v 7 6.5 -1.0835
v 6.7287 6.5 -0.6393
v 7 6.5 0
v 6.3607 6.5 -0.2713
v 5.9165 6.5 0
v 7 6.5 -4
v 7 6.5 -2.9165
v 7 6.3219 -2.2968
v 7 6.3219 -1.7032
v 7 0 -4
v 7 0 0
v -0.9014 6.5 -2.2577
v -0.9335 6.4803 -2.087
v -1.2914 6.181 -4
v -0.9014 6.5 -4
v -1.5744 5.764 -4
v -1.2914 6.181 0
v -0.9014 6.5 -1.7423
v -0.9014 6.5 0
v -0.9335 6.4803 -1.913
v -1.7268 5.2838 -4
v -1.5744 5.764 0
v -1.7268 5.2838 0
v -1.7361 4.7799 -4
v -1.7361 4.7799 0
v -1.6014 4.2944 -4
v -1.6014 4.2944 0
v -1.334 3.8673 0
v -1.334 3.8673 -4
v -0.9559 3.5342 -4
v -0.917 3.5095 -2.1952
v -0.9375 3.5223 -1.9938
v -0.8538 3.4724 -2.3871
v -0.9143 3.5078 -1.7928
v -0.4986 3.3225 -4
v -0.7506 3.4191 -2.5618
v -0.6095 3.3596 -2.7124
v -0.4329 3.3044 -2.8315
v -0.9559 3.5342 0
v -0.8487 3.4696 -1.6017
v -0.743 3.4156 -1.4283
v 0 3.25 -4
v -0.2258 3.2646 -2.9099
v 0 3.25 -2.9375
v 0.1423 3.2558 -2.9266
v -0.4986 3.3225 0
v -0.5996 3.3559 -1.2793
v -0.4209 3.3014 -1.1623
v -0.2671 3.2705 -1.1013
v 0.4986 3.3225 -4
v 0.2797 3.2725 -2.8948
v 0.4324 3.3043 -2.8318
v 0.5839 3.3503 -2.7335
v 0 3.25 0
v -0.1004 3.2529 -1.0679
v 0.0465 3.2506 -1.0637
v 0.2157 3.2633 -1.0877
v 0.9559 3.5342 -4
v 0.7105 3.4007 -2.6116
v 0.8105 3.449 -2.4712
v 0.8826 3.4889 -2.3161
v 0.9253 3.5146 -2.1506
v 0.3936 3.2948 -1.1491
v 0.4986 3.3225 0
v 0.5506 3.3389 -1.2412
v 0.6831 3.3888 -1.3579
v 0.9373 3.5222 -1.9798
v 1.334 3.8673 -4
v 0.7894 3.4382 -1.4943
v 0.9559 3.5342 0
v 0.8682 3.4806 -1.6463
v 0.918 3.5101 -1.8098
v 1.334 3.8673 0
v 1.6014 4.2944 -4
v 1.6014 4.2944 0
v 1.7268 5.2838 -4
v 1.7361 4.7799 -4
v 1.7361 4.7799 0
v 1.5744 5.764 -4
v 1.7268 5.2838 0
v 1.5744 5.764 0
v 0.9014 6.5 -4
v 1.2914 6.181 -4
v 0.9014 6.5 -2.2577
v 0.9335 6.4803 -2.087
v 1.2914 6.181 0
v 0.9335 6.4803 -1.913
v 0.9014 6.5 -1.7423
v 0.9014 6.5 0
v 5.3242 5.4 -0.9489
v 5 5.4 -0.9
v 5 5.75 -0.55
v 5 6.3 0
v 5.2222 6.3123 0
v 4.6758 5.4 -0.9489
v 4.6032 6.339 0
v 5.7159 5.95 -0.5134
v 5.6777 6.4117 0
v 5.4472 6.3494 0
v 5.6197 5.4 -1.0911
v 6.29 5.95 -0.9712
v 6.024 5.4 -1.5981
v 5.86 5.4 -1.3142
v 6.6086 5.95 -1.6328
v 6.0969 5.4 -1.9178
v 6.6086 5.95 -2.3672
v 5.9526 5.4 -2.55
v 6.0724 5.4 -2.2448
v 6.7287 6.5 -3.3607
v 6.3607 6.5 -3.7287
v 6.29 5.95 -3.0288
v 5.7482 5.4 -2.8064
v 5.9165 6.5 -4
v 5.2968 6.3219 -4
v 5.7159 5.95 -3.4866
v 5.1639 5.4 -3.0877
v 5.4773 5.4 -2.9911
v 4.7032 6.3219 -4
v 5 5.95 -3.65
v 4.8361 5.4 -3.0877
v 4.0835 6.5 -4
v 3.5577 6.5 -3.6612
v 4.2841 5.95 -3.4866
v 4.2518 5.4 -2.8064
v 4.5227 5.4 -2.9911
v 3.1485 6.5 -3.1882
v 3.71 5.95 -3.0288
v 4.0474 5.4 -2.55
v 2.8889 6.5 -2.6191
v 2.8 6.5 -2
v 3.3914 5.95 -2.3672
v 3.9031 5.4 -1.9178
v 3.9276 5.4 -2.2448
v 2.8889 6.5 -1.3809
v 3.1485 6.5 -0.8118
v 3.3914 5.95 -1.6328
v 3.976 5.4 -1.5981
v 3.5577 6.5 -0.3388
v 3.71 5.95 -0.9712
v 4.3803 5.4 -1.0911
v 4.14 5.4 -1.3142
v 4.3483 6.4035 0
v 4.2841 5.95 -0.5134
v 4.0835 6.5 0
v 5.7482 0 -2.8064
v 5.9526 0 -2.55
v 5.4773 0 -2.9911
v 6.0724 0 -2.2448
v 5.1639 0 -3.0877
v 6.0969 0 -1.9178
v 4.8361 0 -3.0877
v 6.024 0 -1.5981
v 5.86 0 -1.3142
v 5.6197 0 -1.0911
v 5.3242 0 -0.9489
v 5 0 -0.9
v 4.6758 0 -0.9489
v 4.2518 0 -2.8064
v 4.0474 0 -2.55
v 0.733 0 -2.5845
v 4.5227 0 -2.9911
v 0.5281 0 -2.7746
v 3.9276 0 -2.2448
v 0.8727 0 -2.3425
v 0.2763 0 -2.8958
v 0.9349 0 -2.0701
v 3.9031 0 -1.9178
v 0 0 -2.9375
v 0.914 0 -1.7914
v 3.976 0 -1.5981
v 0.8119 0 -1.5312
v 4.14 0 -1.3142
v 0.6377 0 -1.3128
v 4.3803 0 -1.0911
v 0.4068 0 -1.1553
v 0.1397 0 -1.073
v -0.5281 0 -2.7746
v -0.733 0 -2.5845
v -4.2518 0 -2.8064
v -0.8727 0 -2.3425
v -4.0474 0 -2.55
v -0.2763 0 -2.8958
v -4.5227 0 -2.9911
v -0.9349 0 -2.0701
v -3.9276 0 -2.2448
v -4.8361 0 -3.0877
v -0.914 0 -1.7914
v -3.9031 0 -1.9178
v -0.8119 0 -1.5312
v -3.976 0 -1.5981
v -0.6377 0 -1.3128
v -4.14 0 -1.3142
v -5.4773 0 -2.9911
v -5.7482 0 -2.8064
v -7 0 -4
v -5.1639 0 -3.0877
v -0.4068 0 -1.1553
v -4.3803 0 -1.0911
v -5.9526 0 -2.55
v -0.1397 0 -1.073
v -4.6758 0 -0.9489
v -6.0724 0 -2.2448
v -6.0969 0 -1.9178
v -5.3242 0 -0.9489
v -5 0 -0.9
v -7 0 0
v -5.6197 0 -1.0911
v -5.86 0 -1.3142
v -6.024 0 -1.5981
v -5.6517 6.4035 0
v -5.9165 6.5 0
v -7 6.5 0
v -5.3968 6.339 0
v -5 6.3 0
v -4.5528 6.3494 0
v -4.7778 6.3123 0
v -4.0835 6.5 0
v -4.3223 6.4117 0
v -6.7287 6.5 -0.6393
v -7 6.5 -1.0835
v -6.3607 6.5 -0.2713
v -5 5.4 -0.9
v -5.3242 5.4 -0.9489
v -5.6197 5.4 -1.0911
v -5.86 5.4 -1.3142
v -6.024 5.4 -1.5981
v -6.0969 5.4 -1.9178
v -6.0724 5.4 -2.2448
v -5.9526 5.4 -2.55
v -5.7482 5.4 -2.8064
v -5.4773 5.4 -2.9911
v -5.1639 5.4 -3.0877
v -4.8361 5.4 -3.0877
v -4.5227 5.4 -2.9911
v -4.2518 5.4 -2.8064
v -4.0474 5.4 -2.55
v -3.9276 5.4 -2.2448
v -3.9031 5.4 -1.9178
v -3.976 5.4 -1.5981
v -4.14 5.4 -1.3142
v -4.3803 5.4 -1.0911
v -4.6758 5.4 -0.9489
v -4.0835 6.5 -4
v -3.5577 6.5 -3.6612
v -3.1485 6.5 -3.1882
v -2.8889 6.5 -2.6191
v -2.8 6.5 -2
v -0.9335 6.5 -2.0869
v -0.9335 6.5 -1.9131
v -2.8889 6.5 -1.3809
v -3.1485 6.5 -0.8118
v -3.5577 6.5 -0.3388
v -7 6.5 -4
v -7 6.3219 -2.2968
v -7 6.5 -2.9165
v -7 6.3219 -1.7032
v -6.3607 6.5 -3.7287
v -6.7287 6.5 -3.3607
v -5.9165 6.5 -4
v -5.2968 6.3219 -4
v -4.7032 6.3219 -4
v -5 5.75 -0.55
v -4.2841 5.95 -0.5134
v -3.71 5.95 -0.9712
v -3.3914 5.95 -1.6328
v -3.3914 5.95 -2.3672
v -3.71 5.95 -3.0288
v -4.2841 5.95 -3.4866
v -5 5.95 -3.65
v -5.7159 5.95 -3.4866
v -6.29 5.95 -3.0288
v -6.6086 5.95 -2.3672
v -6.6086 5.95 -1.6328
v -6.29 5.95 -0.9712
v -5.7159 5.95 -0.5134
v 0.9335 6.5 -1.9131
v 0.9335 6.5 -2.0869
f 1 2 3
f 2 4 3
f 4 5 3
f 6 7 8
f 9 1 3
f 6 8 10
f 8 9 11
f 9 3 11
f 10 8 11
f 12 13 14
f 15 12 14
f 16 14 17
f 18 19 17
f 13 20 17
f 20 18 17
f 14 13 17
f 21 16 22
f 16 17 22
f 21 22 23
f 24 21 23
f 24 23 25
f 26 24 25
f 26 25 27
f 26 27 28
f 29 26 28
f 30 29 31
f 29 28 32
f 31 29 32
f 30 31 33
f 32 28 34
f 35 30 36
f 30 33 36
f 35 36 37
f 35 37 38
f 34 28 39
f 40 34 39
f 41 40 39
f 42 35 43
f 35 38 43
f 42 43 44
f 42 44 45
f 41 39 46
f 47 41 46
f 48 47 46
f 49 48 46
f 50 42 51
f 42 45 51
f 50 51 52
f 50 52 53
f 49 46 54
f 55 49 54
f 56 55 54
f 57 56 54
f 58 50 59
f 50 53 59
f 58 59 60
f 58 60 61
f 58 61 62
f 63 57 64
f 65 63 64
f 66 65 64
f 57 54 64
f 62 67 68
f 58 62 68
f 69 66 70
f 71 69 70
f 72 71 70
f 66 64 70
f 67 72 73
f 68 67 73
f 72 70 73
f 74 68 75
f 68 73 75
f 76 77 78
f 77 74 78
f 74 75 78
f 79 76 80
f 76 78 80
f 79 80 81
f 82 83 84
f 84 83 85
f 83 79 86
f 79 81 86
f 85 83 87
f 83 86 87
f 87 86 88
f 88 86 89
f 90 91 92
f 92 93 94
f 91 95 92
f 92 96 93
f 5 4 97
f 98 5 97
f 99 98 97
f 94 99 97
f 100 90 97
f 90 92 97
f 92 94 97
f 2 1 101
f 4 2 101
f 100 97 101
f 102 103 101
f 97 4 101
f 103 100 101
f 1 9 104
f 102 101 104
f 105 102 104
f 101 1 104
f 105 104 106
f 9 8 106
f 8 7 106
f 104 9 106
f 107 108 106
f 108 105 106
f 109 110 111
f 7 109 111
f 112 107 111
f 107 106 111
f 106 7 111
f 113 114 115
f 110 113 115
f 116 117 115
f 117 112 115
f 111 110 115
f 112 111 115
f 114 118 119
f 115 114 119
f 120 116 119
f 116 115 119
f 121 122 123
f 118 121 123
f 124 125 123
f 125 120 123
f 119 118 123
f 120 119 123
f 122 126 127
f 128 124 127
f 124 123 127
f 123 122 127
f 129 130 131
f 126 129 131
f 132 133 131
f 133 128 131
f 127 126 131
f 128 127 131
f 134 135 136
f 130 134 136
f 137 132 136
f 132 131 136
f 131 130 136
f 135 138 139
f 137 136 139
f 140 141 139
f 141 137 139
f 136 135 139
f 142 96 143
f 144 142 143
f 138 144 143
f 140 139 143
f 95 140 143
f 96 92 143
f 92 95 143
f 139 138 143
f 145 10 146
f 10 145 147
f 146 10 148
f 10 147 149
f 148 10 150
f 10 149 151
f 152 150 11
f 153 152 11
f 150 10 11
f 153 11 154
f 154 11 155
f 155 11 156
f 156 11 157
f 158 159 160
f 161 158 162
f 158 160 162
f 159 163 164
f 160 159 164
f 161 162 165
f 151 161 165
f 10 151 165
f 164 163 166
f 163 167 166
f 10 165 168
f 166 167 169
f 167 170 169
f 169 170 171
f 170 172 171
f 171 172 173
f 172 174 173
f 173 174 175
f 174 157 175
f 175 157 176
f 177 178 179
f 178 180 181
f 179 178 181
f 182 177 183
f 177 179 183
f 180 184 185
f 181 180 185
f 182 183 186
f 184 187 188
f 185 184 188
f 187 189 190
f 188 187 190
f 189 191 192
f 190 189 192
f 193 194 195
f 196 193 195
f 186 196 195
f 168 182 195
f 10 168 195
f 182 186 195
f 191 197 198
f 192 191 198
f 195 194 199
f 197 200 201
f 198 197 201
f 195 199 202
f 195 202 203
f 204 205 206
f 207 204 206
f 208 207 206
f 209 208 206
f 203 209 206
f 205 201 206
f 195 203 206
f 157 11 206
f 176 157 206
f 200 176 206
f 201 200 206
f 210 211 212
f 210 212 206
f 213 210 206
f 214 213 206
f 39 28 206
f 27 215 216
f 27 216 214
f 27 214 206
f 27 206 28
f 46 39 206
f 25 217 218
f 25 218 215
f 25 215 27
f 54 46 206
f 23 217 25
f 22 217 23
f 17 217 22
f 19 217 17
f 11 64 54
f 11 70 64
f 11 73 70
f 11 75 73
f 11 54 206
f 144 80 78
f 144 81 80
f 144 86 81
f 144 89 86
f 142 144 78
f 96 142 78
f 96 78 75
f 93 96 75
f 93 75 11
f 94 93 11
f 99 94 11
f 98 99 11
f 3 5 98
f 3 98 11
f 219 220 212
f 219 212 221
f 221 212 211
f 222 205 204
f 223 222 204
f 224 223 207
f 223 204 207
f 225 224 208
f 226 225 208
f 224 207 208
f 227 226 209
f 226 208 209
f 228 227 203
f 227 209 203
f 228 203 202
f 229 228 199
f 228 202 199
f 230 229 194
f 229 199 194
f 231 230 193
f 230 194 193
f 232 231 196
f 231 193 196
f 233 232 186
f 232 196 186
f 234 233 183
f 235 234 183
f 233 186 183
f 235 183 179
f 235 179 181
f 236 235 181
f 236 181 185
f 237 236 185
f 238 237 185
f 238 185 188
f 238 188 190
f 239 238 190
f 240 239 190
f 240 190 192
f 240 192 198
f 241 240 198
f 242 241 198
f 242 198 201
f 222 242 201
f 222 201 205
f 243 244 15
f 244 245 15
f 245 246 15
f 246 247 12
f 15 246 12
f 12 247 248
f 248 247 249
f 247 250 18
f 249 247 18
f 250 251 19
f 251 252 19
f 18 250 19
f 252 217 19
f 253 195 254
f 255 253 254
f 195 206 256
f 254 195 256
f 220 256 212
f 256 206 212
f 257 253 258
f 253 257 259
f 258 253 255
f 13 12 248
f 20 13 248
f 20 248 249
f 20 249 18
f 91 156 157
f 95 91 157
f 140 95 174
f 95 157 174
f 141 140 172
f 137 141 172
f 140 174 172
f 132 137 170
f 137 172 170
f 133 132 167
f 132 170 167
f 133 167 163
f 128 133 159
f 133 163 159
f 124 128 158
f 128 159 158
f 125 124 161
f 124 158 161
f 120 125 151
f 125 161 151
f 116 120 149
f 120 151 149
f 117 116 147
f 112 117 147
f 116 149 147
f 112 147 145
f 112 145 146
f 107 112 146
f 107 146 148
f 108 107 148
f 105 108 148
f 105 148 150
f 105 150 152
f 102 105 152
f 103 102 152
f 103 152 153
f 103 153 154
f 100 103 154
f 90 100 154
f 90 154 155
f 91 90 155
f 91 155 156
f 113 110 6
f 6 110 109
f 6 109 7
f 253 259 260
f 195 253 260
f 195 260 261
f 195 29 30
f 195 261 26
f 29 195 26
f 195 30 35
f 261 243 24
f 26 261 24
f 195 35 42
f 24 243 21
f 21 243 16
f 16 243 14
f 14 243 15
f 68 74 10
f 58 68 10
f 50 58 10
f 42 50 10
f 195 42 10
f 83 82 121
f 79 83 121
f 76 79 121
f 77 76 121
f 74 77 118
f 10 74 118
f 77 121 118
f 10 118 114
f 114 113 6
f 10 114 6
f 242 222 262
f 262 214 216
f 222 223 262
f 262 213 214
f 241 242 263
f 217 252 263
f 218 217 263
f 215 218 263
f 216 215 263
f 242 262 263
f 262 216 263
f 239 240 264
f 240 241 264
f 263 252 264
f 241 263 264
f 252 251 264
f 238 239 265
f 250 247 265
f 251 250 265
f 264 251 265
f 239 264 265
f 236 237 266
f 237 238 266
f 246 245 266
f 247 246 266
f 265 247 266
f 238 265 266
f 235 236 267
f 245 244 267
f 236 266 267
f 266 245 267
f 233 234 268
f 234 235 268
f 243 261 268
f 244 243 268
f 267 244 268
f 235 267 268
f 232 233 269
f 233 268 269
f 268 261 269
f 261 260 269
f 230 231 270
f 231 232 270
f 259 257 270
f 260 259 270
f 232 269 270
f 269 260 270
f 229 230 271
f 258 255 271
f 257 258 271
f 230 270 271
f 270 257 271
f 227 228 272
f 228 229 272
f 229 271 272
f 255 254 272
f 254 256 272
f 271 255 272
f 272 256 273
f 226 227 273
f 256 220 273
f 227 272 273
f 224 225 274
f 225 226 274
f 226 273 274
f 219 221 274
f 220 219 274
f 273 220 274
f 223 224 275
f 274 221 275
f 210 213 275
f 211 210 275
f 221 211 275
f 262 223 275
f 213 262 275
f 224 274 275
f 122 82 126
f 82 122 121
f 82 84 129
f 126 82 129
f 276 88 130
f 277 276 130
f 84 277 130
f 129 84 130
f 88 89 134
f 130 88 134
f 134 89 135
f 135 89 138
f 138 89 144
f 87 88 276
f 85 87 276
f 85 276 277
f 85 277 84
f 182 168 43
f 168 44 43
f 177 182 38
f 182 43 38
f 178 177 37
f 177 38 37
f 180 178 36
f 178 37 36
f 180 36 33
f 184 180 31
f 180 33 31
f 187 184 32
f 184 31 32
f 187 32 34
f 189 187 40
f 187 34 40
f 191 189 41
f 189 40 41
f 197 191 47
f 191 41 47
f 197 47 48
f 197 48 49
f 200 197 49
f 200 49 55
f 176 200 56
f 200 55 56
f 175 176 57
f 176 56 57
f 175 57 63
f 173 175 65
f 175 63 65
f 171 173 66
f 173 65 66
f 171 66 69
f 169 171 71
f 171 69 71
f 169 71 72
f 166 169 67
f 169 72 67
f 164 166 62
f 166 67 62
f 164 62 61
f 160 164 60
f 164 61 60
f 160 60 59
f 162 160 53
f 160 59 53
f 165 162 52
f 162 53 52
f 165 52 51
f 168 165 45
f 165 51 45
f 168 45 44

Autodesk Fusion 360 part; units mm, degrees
sketch "Sketch1" plane through (0, 0, 0) normal (0, 0, 1) x (1, 0, 0)
  circle A0 centre (0, 5) radius 1.75
  line L0 (-7, 6.5) -> (7, 6.5)
  line L1 (7, 6.5) -> (7, 0)
  line L2 (7, 0) -> (-7, 0)
  line L3 (-7, 0) -> (-7, 6.5)
  line L4 (0, 2.5) -> (0, 20) construction
  dimension "d1" = 3.5
  dimension "d2" = 5
  dimension "d3" = 14
  dimension "d4" = 6.5
extrude "Extrude1" add sketch "Sketch1" against normal blind 4 contours A0 L0 L1 L2 L3
sketch "Sketch3" plane through (0, 6.5, 0) normal (0, 1, 0) x (-1, 0, 0)
  line L0 (-0.9014, 0) -> (-7, 0)
  line L1 (-7, 0) -> (-7, -4)
  line L2 (-7, -4) -> (-0.9014, -4)
  line L3 (7, -4) -> (7, 0)
  line L4 (7, -2) -> (-7, -2) construction
  line L5 (0, 0) -> (0, -4.5) construction
  line L6 (-0.9014, -4) -> (-0.9014, 0)
  line L7 (7, 0) -> (0.9014, 0)
  line L8 (0.9014, 0) -> (0.9014, -4)
  line L9 (0.9014, -4) -> (7, -4)
  point P0 (5, -2)
  point P1 (-5, -2)
  dimension "d7" = 10
hole "Hole1" at (5, 6.5, -2) at (-5, 6.5, -2) direction (0, -1, 0) diameter 2.2 end through all countersink diameter 4.4 countersink angle 90
hole "Hole2" at (0, 0, -2) direction (0, 1, 0) diameter 1.875 depth 7.5 tip angle 118
